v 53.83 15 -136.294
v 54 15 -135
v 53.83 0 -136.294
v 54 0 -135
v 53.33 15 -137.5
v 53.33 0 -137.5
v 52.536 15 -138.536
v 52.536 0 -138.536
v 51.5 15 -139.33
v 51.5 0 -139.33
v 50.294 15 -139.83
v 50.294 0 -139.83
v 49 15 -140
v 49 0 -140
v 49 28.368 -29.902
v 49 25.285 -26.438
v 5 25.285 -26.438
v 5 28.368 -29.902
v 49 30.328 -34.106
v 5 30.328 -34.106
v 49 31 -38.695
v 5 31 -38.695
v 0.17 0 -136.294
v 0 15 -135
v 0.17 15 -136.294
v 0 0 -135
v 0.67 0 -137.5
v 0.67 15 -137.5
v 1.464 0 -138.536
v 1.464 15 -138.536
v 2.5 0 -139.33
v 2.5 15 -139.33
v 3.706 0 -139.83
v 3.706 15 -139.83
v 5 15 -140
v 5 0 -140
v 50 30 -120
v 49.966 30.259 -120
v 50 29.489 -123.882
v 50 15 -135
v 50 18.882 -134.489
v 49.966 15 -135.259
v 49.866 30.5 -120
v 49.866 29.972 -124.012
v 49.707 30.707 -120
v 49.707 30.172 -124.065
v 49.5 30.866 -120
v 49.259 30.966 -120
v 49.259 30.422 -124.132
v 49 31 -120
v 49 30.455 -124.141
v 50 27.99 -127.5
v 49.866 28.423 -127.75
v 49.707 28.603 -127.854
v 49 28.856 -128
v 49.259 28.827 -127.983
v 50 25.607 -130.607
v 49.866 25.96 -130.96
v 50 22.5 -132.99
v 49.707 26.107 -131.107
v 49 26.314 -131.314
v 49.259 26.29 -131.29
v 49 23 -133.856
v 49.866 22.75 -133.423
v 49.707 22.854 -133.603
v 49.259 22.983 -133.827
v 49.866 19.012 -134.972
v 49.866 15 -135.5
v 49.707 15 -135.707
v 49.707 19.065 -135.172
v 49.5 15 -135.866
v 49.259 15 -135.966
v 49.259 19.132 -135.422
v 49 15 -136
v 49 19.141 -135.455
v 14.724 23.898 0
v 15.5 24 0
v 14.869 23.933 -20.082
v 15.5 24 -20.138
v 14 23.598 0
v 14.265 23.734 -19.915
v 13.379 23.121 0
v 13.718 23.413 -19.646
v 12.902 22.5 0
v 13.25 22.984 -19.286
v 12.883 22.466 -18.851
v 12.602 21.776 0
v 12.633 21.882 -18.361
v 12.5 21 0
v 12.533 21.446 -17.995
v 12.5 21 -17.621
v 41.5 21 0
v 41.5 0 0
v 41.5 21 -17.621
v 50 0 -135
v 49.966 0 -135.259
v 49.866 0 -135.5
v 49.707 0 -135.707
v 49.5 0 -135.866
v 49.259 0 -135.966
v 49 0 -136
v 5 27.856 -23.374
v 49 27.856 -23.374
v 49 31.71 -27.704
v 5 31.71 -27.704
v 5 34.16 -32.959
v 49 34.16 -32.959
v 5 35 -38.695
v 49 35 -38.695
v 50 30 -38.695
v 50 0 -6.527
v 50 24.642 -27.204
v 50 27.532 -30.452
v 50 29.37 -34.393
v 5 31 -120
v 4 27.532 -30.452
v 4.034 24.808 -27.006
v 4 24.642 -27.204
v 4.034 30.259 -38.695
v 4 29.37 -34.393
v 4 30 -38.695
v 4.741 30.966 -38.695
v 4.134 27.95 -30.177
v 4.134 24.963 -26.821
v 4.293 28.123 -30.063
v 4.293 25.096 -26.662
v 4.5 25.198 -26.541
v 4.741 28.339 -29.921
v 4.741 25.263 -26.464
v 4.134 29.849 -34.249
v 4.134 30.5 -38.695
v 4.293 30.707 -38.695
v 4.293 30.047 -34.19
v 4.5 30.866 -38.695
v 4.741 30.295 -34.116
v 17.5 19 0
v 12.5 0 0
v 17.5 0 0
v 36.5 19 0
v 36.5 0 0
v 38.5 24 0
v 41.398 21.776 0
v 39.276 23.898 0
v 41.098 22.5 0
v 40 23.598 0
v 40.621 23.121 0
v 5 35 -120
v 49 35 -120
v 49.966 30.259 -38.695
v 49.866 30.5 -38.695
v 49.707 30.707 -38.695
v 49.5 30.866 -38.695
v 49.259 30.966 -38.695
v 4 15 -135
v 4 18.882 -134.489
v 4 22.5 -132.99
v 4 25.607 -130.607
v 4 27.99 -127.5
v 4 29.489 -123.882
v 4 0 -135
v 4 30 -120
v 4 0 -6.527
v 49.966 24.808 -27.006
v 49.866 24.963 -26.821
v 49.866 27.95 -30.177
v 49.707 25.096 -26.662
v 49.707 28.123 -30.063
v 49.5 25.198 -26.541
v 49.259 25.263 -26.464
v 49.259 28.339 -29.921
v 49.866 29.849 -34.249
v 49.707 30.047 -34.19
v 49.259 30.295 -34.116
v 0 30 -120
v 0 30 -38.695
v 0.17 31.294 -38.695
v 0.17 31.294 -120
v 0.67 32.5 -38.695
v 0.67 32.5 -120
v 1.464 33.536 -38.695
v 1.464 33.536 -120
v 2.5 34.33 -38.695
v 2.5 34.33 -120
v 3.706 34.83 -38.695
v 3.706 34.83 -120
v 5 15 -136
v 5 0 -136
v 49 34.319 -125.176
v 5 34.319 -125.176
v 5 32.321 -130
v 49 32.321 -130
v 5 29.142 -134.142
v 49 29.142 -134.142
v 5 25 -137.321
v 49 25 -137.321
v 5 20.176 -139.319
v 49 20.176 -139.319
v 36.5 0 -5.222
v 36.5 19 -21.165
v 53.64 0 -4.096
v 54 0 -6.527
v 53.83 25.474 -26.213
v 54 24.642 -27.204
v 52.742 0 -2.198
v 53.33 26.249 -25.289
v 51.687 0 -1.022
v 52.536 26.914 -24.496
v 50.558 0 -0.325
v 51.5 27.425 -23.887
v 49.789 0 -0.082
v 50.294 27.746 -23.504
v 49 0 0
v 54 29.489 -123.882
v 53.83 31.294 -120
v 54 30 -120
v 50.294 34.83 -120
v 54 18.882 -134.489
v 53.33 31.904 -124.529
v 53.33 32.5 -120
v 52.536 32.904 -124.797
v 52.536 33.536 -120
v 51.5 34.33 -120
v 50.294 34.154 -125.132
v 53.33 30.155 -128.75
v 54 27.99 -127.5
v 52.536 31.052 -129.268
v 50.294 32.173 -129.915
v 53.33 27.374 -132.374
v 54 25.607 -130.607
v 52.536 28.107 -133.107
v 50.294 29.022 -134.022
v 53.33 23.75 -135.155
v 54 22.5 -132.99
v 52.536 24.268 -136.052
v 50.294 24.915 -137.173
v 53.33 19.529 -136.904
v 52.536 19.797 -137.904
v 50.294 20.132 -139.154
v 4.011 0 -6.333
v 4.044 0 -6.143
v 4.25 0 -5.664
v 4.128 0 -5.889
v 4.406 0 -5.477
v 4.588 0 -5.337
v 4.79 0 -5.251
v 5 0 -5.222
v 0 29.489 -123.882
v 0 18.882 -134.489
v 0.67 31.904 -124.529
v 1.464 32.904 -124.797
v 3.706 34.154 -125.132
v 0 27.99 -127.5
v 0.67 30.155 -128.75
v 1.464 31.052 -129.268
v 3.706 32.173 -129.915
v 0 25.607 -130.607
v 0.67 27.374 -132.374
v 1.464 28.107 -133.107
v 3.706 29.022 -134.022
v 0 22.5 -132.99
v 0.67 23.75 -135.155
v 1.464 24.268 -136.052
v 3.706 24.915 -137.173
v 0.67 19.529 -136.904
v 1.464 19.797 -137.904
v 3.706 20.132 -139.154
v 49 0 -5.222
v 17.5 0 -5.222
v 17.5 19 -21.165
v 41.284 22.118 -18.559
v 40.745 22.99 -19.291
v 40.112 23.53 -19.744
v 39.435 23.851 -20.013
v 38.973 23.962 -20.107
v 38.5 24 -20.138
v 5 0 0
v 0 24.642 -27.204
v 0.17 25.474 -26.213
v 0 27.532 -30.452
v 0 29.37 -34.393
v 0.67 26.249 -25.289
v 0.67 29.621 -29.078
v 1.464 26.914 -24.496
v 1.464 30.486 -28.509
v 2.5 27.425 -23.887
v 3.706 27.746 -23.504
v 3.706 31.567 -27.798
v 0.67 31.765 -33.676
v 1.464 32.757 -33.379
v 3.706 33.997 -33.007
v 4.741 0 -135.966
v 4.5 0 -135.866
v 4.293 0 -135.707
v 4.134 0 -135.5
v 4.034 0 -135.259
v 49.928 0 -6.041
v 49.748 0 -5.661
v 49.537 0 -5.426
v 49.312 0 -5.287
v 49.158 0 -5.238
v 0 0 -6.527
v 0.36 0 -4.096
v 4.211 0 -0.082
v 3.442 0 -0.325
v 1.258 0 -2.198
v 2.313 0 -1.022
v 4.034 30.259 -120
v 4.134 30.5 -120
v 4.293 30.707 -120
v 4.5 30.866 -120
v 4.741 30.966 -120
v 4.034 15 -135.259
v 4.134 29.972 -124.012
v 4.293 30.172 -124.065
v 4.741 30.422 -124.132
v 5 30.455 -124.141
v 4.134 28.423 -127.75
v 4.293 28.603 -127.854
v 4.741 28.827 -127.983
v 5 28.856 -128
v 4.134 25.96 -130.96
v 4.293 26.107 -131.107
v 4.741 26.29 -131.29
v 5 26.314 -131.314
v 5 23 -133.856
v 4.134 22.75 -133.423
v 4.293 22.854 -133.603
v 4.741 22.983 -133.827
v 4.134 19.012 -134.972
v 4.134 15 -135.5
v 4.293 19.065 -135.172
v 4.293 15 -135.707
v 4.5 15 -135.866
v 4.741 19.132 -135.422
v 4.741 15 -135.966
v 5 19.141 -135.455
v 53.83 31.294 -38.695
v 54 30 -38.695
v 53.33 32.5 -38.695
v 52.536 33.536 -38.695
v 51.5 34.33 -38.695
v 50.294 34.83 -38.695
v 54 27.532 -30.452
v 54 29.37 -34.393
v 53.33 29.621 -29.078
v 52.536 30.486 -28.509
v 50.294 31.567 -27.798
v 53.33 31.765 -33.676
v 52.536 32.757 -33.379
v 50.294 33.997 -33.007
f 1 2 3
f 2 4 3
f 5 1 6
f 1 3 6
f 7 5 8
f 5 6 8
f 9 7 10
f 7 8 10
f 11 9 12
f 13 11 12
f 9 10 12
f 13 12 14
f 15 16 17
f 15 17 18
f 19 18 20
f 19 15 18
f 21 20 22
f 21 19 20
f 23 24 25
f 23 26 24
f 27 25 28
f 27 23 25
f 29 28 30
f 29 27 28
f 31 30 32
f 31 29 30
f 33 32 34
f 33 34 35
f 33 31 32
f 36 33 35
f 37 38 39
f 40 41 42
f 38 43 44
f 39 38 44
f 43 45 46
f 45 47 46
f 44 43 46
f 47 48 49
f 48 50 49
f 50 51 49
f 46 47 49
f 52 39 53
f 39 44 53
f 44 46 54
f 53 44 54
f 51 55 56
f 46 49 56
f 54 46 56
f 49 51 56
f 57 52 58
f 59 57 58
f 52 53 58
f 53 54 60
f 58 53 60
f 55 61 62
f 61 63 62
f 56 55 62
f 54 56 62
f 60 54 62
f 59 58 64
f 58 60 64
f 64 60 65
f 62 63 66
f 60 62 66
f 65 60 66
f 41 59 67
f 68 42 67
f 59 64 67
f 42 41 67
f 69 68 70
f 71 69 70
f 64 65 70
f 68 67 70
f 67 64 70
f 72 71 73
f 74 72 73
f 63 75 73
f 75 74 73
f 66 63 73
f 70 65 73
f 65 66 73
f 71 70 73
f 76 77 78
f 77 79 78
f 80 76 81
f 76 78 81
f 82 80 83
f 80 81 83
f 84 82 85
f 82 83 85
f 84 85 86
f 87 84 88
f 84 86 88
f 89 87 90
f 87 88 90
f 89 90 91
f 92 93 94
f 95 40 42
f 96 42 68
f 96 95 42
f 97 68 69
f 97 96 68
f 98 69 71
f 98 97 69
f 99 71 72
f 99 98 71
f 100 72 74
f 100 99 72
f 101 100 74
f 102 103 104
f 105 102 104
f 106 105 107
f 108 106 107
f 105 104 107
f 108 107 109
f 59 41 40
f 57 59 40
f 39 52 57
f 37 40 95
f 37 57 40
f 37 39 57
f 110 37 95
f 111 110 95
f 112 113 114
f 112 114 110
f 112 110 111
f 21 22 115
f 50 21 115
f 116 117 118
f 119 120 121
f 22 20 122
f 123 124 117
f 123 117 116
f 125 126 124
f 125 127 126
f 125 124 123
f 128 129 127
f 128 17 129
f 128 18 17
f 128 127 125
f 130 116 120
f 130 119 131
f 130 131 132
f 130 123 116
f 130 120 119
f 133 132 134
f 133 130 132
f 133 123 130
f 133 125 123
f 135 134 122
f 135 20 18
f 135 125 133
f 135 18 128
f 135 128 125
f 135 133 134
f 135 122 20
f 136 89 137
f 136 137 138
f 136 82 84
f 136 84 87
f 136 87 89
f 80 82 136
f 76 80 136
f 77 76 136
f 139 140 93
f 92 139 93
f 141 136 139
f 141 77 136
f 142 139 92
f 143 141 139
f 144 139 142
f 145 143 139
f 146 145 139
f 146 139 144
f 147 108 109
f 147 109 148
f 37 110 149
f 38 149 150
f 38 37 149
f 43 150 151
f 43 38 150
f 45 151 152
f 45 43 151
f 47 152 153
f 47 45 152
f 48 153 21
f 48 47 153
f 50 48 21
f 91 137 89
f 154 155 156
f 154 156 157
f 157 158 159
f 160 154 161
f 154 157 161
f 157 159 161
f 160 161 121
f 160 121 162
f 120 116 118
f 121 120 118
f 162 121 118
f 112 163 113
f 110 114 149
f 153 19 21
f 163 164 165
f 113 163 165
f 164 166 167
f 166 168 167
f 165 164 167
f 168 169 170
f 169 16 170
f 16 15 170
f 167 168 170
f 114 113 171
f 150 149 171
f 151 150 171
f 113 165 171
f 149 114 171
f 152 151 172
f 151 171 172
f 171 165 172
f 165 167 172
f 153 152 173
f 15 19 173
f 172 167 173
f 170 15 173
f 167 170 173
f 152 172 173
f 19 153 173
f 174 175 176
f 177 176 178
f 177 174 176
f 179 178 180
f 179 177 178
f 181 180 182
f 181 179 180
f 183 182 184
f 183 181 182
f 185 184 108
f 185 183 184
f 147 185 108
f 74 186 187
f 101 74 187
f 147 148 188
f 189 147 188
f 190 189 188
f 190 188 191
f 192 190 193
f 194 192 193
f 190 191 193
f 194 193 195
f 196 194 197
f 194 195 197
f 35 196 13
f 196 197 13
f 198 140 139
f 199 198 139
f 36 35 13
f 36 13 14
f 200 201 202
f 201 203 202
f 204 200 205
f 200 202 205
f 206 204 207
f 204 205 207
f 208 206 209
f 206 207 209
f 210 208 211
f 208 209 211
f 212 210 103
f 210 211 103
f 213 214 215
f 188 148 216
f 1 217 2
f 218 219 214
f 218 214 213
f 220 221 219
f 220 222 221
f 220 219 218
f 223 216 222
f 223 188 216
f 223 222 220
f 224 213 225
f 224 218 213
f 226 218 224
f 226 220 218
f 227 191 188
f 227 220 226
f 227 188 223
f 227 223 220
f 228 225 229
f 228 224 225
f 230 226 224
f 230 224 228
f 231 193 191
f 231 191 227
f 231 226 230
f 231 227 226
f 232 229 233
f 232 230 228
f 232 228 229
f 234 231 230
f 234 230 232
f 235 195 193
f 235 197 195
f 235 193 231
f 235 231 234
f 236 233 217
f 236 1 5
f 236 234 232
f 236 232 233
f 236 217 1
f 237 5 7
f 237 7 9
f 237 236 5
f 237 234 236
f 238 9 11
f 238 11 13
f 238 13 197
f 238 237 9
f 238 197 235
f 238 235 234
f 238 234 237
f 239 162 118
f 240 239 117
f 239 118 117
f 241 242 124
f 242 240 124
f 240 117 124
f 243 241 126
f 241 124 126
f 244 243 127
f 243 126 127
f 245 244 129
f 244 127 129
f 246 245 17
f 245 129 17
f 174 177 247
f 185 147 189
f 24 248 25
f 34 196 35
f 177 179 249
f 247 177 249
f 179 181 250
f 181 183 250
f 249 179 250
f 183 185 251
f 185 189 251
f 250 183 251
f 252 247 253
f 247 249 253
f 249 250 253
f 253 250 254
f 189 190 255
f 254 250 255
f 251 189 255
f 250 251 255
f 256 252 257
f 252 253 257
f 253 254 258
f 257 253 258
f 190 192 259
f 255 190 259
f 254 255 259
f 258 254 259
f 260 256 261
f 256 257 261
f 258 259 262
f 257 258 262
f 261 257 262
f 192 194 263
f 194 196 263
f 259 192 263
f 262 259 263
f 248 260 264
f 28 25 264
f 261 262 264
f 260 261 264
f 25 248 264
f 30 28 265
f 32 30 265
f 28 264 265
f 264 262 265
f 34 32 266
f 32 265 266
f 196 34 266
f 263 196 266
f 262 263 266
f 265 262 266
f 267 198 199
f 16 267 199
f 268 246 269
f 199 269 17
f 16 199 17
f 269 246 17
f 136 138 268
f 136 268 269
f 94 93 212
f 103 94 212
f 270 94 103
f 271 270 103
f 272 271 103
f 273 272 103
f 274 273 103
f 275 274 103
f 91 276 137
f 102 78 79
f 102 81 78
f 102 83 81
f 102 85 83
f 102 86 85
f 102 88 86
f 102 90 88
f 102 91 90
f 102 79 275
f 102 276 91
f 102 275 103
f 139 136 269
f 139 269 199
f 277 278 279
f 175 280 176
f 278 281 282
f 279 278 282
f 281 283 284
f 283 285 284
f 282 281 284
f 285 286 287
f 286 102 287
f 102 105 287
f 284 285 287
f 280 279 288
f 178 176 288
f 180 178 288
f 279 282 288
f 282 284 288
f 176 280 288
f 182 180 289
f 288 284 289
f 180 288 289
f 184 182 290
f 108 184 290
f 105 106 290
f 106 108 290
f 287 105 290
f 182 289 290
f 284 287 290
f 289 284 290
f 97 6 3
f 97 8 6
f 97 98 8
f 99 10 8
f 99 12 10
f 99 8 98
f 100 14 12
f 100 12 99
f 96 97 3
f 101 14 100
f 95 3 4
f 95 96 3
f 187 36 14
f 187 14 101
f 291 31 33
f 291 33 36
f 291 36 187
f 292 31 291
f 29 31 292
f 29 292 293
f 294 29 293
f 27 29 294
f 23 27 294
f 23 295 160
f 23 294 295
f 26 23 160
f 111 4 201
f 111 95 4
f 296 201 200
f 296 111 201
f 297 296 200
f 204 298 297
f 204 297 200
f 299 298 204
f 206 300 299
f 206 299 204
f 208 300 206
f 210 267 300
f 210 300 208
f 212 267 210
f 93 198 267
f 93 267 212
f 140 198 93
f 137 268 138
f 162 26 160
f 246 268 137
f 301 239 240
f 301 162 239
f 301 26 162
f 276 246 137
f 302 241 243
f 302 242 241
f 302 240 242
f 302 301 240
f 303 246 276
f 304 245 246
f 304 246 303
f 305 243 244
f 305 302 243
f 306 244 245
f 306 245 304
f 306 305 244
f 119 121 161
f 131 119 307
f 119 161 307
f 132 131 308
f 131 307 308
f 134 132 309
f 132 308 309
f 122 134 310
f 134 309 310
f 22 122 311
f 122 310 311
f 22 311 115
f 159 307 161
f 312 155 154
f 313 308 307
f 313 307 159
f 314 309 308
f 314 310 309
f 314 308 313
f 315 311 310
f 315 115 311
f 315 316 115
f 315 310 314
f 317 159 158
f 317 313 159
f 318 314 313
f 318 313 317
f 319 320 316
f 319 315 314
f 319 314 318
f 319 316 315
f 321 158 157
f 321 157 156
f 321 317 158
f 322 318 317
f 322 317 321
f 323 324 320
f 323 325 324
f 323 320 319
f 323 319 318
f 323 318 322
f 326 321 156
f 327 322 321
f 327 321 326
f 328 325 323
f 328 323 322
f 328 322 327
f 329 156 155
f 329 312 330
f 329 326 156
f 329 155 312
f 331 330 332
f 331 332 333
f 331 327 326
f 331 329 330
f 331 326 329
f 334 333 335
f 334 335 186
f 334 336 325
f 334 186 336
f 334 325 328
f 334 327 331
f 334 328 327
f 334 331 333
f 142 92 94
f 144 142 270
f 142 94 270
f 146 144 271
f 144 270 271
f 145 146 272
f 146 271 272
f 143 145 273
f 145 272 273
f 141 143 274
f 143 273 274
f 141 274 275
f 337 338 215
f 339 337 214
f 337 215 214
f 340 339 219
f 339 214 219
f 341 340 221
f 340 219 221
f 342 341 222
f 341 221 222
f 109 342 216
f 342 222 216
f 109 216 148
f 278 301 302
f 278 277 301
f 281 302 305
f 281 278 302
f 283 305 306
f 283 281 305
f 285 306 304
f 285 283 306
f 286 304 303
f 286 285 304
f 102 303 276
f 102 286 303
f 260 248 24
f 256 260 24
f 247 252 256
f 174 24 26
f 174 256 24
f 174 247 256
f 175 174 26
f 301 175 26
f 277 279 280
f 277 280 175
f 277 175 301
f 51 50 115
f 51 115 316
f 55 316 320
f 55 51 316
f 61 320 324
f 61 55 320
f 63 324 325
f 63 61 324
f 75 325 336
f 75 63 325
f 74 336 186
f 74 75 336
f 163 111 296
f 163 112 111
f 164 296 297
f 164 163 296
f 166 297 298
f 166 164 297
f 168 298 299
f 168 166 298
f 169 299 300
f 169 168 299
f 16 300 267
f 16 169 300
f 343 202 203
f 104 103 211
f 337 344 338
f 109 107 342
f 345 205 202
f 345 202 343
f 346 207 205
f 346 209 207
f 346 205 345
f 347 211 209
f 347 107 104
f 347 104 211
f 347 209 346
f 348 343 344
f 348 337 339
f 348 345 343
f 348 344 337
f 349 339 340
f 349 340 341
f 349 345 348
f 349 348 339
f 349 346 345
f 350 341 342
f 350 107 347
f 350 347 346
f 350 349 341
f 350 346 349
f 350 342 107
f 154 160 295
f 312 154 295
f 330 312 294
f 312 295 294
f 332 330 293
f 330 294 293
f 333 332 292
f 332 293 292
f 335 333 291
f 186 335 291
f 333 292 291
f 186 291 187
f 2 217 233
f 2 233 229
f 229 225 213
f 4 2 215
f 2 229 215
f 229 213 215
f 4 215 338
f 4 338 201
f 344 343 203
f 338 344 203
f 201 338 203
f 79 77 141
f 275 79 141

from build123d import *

# Parameters (mm, degrees)
BOSS_EXTRUDE1_DEPTH = 54
FILLET1_R           = 20
FILLET2_R           = 5
SHELL1_T            = -4
BOSS_EXTRUDE2_REACH = 156.081
SKETCH2_W           = 29
SKETCH2_H           = 24
SKETCH3_W           = 19
SKETCH3_H           = 19
CUT_EXTRUDE1_DEPTH  = 54
FILLET3_R           = 3


with BuildPart() as part:
    # Sketch1 → Boss-Extrude1 (new body)
    with BuildSketch(Plane(origin=(0, 0, 0), x_dir=(0, 0, -1), z_dir=(1, 0, 0))):
        Polygon((0, 0), (29.368487091, 35), (140, 35), (140, 0), align=None)
    extrude(amount=BOSS_EXTRUDE1_DEPTH)

    # Fillet1
    fillet1_edges = [part.edges().sort_by_distance(p)[0] for p in [
        (27, 35, -29.368487091),
        (27, 35, -140),
    ]]
    fillet(fillet1_edges, radius=FILLET1_R)

    # Fillet2
    fillet2_edges = [part.edges().sort_by_distance(p)[0] for p in [
        (0, 35, -79.347320127),
        (54, 35, -79.347320127),
        (0, 13.927876097, -11.686875696),
        (0, 33.126155741, -30.242275019),
        (0, 29.142135624, -134.142135624),
        (54, 13.927876097, -11.686875696),
        (54, 33.126155741, -30.242275019),
        (54, 29.142135624, -134.142135624),
        (0, 7.5, -140),
        (54, 7.5, -140),
    ]]
    fillet(fillet2_edges, radius=FILLET2_R)

    # Shell1
    shell1_openings = [part.faces().sort_by_distance(p)[0] for p in [
        (27, 0, -70.029322897),
    ]]
    offset(amount=SHELL1_T, openings=shell1_openings, kind=Kind.INTERSECTION)

    # Boss-Extrude2: up to this face of the body (flat: up to its plane)
    boss_extrude2_end = Plane(part.part.faces().sort_by_distance((27, 13.927876097, -11.686875696))[0])
    # Sketch2 → Boss-Extrude2 (add, up to the picked face)
    with BuildSketch(Plane.XY, mode=Mode.PRIVATE) as boss_extrude2_sk1:
        with Locations((27, 12)):
            Rectangle(SKETCH2_W, SKETCH2_H)
    boss_extrude2_tool1 = split(extrude(boss_extrude2_sk1.sketch, amount=-BOSS_EXTRUDE2_REACH, mode=Mode.PRIVATE), bisect_by=boss_extrude2_end, keep=Keep.BOTH, mode=Mode.PRIVATE)
    add(boss_extrude2_tool1.solids().sort_by(Axis((27, 12, 0), (0, 0, -1)))[0])

    # Sketch3 → Cut-Extrude1 (cut)
    with BuildSketch(Plane.XY):
        with Locations((27, 9.5)):
            Rectangle(SKETCH3_W, SKETCH3_H)
    extrude(amount=-CUT_EXTRUDE1_DEPTH, mode=Mode.SUBTRACT)

    # Fillet3
    fillet3_edges = [part.edges().sort_by_distance(p)[0] for p in [
        (41.5, 24, -10.069195574),
        (12.5, 24, -10.069195574),
    ]]
    fillet(fillet3_edges, radius=FILLET3_R)


solid = part.part
